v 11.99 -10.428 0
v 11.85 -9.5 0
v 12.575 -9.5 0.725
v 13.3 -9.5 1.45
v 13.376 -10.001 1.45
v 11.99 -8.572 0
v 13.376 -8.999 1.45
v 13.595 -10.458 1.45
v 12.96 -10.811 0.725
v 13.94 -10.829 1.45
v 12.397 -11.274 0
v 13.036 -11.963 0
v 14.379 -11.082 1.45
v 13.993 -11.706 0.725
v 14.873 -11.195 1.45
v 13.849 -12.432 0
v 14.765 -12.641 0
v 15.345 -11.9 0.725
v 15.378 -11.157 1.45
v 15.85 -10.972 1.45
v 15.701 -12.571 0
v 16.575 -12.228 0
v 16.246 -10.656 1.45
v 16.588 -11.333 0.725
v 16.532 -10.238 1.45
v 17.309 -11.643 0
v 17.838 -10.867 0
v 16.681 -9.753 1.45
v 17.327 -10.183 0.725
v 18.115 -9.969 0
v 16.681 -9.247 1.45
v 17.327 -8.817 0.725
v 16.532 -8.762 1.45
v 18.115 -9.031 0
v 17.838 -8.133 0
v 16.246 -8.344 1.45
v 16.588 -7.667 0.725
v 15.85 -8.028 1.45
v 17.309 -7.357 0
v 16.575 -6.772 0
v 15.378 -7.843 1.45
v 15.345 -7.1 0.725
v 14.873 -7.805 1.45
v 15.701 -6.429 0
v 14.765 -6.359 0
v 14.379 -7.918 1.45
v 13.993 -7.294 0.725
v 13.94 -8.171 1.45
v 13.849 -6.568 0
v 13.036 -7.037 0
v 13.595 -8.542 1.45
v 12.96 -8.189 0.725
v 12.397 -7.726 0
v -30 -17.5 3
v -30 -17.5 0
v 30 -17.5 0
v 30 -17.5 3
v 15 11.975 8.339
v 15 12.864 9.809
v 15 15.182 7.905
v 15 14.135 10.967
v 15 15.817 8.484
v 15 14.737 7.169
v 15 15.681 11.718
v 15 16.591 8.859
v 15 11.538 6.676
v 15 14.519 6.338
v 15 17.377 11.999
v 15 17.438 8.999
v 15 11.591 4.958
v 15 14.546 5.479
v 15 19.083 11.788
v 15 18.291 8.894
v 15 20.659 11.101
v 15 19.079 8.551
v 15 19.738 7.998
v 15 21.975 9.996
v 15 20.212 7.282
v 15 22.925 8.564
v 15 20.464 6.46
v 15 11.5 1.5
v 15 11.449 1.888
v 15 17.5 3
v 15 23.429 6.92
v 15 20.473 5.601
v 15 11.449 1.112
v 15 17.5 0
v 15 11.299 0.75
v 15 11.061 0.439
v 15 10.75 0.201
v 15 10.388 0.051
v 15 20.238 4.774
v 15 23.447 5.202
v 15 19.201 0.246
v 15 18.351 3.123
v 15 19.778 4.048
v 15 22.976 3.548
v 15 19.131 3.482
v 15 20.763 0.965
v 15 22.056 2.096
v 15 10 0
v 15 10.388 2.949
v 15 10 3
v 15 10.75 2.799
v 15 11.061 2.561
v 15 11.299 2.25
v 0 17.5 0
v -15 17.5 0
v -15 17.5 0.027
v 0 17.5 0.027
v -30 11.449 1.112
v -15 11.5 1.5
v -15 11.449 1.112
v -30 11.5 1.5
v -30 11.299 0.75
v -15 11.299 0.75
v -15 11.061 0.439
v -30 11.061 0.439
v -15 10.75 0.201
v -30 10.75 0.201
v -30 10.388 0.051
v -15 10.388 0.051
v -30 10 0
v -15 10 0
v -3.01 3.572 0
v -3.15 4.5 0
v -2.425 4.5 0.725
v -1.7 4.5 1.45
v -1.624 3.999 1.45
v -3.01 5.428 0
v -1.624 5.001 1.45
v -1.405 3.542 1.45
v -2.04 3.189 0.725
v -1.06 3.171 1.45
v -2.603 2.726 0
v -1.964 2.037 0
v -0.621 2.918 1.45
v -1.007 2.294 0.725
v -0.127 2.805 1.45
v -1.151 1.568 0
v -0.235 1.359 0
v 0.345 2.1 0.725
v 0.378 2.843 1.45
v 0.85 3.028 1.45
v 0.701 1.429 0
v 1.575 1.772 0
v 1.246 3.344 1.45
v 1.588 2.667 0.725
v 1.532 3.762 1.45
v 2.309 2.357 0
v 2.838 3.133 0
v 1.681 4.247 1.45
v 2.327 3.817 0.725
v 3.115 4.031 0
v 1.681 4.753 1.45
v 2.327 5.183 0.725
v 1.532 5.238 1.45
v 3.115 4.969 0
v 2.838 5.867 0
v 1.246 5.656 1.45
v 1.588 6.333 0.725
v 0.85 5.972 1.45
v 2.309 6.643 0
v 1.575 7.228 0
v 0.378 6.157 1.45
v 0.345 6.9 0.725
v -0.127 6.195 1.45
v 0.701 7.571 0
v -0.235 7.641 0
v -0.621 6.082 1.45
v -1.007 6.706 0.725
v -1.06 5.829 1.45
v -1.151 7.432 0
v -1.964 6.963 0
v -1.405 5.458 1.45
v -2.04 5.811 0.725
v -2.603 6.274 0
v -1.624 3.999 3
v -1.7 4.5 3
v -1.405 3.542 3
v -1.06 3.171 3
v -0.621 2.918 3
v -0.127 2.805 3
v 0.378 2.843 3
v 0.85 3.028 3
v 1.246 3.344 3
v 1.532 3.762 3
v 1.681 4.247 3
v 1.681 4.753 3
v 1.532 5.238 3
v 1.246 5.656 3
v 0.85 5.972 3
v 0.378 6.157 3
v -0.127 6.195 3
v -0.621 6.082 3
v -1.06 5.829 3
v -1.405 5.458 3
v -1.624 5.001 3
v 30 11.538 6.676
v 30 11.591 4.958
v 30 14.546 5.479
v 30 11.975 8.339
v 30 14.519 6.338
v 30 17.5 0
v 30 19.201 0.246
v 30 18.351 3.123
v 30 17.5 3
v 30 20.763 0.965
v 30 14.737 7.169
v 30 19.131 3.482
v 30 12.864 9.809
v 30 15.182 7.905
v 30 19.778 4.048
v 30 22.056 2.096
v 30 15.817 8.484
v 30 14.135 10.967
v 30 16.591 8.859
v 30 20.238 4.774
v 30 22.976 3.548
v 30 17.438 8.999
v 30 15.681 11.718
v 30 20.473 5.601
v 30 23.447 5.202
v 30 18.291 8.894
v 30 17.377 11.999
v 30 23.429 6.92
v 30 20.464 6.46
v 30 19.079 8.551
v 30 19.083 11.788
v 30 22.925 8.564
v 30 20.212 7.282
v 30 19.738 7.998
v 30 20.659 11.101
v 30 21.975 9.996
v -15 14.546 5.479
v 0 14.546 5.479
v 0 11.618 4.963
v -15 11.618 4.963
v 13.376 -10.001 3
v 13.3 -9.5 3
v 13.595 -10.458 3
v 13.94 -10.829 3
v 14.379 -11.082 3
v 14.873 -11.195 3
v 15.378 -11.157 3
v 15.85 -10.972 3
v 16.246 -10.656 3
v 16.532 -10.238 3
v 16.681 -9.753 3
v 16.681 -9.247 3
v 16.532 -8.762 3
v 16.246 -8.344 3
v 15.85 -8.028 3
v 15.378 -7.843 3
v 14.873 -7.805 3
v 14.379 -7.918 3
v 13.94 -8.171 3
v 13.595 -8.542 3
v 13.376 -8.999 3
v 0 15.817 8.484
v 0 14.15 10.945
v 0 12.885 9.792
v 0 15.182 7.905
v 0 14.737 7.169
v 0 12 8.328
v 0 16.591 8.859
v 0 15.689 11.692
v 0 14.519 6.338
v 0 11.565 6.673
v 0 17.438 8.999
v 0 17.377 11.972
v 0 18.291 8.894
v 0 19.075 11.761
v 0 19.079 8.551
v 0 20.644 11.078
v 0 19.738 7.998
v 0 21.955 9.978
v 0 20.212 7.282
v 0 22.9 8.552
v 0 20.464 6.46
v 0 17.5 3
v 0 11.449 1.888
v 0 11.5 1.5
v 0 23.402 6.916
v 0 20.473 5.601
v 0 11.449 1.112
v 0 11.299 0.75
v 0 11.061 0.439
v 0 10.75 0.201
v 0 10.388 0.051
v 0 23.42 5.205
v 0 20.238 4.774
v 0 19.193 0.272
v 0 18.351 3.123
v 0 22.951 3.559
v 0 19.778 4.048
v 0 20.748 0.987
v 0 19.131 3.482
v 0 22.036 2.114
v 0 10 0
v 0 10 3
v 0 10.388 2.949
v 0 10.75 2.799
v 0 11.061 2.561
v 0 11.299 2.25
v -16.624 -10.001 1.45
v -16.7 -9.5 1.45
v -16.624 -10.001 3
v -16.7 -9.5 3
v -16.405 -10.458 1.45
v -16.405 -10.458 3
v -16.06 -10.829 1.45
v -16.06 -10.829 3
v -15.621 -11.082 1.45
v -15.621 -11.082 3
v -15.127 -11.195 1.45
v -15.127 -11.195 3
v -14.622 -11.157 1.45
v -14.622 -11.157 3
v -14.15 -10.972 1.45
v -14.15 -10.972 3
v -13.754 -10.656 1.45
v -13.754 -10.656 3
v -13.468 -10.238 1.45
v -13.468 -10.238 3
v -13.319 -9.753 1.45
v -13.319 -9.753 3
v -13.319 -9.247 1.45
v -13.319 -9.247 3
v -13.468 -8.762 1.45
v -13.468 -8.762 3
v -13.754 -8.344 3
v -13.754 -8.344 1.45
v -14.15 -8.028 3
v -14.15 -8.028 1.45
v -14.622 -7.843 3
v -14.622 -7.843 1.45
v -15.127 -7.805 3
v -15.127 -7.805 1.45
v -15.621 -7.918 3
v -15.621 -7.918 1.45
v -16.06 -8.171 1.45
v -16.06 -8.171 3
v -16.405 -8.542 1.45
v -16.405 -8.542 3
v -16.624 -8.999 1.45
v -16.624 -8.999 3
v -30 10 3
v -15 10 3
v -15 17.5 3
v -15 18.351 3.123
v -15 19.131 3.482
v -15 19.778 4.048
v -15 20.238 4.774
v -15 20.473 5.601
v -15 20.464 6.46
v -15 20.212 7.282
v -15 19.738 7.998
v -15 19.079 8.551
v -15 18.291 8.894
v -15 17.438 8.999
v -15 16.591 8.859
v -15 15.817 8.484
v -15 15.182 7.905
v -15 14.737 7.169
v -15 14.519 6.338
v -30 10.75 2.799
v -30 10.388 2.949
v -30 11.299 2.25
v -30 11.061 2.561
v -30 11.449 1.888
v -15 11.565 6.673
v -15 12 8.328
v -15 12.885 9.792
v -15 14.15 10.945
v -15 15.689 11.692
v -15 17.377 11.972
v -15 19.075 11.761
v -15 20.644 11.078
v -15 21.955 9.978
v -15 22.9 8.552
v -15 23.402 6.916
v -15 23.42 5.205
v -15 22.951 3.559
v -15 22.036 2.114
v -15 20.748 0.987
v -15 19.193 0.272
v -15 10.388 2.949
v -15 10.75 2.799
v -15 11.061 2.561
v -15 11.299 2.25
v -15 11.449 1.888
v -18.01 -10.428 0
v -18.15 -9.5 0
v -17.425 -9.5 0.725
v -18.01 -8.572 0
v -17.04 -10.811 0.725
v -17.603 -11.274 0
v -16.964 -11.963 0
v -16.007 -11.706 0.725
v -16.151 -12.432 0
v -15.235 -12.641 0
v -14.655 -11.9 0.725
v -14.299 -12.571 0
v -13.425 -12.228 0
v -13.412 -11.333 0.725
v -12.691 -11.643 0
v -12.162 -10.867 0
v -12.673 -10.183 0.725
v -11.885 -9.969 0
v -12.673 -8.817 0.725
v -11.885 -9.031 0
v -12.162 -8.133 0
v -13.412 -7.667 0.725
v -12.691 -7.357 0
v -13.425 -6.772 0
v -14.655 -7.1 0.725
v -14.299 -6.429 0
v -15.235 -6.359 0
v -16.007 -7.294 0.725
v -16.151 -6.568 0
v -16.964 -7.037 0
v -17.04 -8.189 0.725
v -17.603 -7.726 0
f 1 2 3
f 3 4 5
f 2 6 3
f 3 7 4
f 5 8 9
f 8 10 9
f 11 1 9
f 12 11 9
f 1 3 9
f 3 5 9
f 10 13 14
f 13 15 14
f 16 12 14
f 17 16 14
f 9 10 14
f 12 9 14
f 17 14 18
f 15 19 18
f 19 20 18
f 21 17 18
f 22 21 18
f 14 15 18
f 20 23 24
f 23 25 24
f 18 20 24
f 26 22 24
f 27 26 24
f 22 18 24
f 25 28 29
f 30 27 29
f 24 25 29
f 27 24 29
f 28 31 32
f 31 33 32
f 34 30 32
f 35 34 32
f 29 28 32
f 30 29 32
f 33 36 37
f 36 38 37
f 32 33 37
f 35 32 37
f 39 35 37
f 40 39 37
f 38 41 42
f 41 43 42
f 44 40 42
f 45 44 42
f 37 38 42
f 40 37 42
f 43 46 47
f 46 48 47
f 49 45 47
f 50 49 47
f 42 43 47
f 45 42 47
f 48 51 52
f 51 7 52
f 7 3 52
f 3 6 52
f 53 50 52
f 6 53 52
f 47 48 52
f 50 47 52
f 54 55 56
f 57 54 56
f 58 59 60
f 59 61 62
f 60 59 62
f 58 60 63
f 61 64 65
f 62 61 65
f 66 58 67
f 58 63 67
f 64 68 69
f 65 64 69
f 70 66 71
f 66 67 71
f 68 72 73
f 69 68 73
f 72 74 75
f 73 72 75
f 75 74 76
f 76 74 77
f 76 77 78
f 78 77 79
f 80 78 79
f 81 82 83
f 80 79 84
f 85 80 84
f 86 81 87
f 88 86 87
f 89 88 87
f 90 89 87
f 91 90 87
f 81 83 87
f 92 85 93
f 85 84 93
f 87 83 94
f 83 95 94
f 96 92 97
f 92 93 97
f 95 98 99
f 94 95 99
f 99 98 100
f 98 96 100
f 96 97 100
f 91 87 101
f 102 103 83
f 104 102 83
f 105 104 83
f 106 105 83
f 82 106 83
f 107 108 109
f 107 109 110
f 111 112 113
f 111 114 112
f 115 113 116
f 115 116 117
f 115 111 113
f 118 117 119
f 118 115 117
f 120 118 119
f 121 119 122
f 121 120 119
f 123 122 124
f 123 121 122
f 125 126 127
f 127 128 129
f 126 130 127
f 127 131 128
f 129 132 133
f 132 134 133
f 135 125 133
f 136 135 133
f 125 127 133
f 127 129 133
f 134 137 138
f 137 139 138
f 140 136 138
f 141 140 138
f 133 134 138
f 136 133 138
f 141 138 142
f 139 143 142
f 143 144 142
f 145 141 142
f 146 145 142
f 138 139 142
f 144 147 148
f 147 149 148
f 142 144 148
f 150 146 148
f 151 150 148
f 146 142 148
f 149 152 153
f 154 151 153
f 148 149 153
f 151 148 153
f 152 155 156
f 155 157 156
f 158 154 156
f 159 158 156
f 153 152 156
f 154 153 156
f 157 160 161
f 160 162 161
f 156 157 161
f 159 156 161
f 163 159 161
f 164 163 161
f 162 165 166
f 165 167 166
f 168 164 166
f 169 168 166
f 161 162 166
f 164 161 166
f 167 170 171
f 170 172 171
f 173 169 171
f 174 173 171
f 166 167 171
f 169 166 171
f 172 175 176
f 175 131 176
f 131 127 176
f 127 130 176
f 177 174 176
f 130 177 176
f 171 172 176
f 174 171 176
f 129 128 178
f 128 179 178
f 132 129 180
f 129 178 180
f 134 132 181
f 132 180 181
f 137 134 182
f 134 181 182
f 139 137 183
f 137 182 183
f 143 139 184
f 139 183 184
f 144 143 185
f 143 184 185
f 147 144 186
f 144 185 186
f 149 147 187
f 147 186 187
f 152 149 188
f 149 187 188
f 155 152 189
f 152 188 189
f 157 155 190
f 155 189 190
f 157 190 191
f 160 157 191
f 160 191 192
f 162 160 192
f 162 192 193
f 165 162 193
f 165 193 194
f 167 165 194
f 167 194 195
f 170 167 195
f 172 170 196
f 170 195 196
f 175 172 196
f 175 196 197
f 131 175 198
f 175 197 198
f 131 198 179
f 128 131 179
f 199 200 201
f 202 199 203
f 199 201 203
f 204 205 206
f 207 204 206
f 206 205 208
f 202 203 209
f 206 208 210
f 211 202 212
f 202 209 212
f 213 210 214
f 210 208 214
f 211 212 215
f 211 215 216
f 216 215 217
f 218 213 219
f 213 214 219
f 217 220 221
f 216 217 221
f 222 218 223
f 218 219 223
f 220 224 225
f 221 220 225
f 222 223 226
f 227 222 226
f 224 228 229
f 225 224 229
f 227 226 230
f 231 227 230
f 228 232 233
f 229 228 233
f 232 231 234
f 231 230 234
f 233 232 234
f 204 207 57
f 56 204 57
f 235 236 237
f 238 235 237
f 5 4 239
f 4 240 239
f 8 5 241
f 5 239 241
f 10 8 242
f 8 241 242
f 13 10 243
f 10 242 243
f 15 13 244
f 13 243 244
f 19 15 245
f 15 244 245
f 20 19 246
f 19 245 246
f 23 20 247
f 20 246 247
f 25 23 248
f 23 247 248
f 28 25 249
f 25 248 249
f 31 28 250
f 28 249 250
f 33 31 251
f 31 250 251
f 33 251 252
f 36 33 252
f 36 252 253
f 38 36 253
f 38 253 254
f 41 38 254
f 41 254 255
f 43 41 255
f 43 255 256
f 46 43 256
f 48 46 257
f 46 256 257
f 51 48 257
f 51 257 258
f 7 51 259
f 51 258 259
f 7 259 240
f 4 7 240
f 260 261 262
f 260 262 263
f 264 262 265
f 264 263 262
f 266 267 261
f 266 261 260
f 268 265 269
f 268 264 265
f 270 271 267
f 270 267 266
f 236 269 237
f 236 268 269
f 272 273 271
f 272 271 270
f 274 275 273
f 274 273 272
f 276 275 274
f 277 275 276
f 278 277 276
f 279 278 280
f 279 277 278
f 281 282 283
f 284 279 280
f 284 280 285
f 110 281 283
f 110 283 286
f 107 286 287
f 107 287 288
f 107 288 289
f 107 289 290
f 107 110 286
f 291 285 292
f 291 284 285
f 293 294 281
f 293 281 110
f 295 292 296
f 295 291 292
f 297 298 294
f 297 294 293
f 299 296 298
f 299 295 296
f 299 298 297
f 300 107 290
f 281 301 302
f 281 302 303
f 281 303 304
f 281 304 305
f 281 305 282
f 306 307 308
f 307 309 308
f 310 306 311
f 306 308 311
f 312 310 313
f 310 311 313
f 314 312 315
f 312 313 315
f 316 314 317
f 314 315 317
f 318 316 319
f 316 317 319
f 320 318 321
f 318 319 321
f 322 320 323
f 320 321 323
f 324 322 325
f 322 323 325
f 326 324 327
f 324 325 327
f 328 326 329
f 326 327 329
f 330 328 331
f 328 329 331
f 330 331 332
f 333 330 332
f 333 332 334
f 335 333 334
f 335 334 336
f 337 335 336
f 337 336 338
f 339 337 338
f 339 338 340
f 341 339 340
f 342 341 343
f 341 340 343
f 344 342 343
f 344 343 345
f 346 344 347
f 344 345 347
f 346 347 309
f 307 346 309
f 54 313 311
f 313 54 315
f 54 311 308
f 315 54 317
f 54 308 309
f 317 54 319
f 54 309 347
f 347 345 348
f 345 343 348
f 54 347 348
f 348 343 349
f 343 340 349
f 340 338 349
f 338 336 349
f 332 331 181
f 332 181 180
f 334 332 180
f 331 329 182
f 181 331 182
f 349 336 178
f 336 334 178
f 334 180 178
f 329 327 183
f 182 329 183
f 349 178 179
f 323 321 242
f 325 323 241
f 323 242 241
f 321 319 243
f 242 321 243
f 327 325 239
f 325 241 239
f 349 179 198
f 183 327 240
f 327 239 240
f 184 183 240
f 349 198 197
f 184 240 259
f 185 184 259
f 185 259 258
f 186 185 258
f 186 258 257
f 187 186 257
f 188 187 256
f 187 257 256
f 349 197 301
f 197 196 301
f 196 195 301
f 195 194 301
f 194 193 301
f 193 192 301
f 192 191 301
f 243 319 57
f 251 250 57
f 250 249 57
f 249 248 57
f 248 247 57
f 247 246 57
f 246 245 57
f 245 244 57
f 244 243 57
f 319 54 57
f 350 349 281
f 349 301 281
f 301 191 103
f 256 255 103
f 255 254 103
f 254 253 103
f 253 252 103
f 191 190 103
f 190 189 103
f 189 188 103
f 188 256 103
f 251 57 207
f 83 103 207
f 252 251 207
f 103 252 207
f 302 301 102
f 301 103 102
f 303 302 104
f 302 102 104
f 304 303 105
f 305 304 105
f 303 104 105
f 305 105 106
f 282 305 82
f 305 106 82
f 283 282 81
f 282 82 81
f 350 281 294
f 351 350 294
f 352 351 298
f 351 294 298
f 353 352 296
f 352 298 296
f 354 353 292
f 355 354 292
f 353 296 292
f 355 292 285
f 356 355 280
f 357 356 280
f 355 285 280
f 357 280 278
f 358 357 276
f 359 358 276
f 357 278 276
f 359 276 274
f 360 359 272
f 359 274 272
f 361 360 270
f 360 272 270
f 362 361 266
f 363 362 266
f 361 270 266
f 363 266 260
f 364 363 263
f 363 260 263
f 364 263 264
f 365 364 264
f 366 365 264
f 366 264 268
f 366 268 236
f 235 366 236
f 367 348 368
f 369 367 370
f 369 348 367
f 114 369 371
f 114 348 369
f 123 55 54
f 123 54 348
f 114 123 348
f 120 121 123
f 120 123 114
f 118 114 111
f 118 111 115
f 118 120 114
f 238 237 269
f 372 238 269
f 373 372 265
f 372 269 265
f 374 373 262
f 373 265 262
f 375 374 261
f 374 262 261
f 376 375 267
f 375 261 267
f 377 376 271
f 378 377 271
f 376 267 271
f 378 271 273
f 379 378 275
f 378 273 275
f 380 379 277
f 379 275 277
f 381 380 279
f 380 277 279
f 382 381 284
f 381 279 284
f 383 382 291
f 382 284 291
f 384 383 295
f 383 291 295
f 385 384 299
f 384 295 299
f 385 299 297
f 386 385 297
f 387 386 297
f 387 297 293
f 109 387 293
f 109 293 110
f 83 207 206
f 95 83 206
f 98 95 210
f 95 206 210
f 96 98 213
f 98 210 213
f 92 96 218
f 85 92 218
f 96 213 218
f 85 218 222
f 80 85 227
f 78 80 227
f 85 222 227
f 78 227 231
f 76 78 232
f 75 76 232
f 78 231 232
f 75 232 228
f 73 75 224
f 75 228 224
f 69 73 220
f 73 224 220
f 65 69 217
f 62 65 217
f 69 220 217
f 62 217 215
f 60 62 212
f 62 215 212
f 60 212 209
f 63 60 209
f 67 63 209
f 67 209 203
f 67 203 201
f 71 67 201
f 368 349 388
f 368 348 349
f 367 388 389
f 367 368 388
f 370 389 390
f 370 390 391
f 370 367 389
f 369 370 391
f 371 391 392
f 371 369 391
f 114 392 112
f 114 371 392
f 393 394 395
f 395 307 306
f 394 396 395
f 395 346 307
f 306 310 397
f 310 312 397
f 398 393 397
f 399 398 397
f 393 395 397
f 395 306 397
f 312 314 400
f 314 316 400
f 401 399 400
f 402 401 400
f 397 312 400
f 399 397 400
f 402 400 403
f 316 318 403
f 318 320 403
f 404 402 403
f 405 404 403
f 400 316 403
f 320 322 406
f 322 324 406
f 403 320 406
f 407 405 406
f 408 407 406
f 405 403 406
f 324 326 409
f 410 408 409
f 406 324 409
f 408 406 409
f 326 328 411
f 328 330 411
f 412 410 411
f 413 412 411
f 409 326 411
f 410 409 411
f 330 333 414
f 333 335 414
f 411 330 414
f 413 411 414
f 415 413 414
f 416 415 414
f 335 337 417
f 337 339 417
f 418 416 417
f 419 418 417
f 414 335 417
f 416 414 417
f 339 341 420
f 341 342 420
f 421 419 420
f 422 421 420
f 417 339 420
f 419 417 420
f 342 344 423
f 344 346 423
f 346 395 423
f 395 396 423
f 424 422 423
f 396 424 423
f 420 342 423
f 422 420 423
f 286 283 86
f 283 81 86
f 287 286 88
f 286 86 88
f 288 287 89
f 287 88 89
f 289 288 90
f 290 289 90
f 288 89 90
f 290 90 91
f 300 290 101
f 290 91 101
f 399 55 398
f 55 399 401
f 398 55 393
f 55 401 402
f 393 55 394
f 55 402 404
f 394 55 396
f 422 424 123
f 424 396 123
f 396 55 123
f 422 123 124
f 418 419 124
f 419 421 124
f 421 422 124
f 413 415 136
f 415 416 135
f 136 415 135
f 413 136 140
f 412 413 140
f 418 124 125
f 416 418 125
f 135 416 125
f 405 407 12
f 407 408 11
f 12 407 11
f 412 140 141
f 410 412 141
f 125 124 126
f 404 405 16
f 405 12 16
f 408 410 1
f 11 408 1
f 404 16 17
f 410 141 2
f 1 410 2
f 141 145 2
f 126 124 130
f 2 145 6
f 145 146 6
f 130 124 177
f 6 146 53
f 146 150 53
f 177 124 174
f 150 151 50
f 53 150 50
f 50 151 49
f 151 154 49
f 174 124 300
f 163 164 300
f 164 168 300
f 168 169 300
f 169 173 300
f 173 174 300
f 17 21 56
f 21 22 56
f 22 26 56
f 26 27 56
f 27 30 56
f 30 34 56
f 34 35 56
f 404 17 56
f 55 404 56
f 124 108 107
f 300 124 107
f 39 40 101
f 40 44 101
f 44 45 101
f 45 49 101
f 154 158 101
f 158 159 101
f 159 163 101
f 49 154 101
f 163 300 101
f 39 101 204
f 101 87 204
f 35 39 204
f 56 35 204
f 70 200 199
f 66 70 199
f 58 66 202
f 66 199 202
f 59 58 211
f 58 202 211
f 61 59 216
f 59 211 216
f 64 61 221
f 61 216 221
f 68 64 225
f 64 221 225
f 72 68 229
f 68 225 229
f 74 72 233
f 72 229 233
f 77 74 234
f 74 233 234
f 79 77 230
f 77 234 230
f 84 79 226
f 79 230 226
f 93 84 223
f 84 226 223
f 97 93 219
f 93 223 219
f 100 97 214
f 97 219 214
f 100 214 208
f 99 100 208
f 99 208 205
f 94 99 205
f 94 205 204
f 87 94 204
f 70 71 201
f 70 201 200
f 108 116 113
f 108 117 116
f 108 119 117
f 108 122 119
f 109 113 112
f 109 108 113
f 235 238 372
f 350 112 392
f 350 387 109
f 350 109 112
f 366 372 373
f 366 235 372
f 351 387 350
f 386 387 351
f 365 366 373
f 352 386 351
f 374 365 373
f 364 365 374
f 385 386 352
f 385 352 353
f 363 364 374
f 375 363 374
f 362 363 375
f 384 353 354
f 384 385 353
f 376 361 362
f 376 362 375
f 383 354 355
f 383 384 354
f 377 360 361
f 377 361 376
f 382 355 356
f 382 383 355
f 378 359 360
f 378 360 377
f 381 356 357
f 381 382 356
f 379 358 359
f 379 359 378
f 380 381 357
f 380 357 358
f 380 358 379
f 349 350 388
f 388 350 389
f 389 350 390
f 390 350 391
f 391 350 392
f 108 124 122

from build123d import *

# Parameters (mm, degrees)
SKETCH1_W                                           = 60
SKETCH1_H                                           = 35
BOSS_EXTRUDE1_DEPTH                                 = 3
CSK_FOR_M3_COUNTERSUNK_FLAT_HEAD_SCREW1_D           = 3.4
CSK_FOR_M3_COUNTERSUNK_FLAT_HEAD_SCREW1_DEPTH       = 3
CSK_FOR_M3_COUNTERSUNK_FLAT_HEAD_SCREW1_CSINK_D     = 6.3
CSK_FOR_M3_COUNTERSUNK_FLAT_HEAD_SCREW1_CSINK_ANGLE = 90
CSK_FOR_M3_COUNTERSUNK_FLAT_HEAD_SCREW1_TIP         = 1.021463052
BOSS_EXTRUDE2_DEPTH                                 = 15
BOSS_EXTRUDE3_DEPTH                                 = 15
CUT_EXTRUDE4_DEPTH                                  = 15
SKETCH8_W                                           = 3
SKETCH8_H                                           = 6
CUT_EXTRUDE5_DEPTH                                  = 15
FILLET4_R                                           = 1.5


with BuildPart() as part:
    # Sketch1 → Boss-Extrude1 (new body)
    with BuildSketch(Plane.XY):
        Rectangle(SKETCH1_W, SKETCH1_H)
    extrude(amount=BOSS_EXTRUDE1_DEPTH)

    # CSK for M3 Countersunk Flat Head Screw1
    with Locations(Plane(origin=(0, 0, 0), x_dir=(1, 0, 0), z_dir=(0, 0, -1))):
        with Locations((0, -4.5), (-15, 9.5), (15, 9.5)):
            CounterSinkHole(CSK_FOR_M3_COUNTERSUNK_FLAT_HEAD_SCREW1_D / 2, CSK_FOR_M3_COUNTERSUNK_FLAT_HEAD_SCREW1_CSINK_D / 2, depth=CSK_FOR_M3_COUNTERSUNK_FLAT_HEAD_SCREW1_DEPTH, counter_sink_angle=CSK_FOR_M3_COUNTERSUNK_FLAT_HEAD_SCREW1_CSINK_ANGLE)
            with Locations((0, 0, -(CSK_FOR_M3_COUNTERSUNK_FLAT_HEAD_SCREW1_DEPTH + CSK_FOR_M3_COUNTERSUNK_FLAT_HEAD_SCREW1_TIP / 2))):  # 118° drill point
                Cone(0, CSK_FOR_M3_COUNTERSUNK_FLAT_HEAD_SCREW1_D / 2, CSK_FOR_M3_COUNTERSUNK_FLAT_HEAD_SCREW1_TIP, mode=Mode.SUBTRACT)

    # Sketch5 → Boss-Extrude2 (add)
    with BuildSketch(Plane(origin=(30, 0, 0), x_dir=(0, 0, -1), z_dir=(1, 0, 0))):
        with BuildLine():
            Line((-5.479055467, 14.545576741), (-4.958110934, 11.591153482))
            ThreePointArc((-4.958110934, 11.591153482), (-8.05212086, 23.138155725), (-3, 12.303847577))
            Line((-3, 12.303847577), (-3, 17.5))
            ThreePointArc((-3, 17.5), (-8.298133329, 19.428362829), (-5.479055467, 14.545576741))
        make_face()
    extrude(amount=-BOSS_EXTRUDE2_DEPTH)

    # Sketch6 → Boss-Extrude3 (add)
    with BuildSketch(Plane.ZY):
        with BuildLine():
            Line((3, 12.335251693), (3, 17.5))
            ThreePointArc((3, 17.5), (8.298133329, 19.428362829), (5.479055467, 14.545576741))
            Line((5.479055467, 14.545576741), (4.962830018, 11.617916738))
            ThreePointArc((4.962830018, 11.617916738), (8.050201874, 23.109928462), (3, 12.335251693))
        make_face()
    extrude(amount=BOSS_EXTRUDE3_DEPTH)

    # Sketch9 → Cut-Extrude4 (cut)
    with BuildSketch(Plane.ZY.offset(15)):
        Polygon((0.004777877, 17.5), (0, 17.5), (0, 11.5), (3, 11.5), (3, 17.5), (0.027176122, 17.5), align=None)
    extrude(amount=CUT_EXTRUDE4_DEPTH, mode=Mode.SUBTRACT)

    # Sketch8 → Cut-Extrude5 (cut)
    with BuildSketch(Plane(origin=(0, 0, 0), x_dir=(0, 0, -1), z_dir=(1, 0, 0))):
        with Locations((-1.5, 14.5)):
            Rectangle(SKETCH8_W, SKETCH8_H)
    extrude(amount=CUT_EXTRUDE5_DEPTH, mode=Mode.SUBTRACT)

    # Fillet4
    fillet4_edges = [part.edges().sort_by_distance(p)[0] for p in [
        (-22.5, 11.5, 0),
        (-22.5, 11.5, 3),
        (7.5, 11.5, 0),
        (7.5, 11.5, 3),
    ]]
    fillet(fillet4_edges, radius=FILLET4_R - 0.0001)  # a hair under: the kernel refuses the full size


solid = part.part
